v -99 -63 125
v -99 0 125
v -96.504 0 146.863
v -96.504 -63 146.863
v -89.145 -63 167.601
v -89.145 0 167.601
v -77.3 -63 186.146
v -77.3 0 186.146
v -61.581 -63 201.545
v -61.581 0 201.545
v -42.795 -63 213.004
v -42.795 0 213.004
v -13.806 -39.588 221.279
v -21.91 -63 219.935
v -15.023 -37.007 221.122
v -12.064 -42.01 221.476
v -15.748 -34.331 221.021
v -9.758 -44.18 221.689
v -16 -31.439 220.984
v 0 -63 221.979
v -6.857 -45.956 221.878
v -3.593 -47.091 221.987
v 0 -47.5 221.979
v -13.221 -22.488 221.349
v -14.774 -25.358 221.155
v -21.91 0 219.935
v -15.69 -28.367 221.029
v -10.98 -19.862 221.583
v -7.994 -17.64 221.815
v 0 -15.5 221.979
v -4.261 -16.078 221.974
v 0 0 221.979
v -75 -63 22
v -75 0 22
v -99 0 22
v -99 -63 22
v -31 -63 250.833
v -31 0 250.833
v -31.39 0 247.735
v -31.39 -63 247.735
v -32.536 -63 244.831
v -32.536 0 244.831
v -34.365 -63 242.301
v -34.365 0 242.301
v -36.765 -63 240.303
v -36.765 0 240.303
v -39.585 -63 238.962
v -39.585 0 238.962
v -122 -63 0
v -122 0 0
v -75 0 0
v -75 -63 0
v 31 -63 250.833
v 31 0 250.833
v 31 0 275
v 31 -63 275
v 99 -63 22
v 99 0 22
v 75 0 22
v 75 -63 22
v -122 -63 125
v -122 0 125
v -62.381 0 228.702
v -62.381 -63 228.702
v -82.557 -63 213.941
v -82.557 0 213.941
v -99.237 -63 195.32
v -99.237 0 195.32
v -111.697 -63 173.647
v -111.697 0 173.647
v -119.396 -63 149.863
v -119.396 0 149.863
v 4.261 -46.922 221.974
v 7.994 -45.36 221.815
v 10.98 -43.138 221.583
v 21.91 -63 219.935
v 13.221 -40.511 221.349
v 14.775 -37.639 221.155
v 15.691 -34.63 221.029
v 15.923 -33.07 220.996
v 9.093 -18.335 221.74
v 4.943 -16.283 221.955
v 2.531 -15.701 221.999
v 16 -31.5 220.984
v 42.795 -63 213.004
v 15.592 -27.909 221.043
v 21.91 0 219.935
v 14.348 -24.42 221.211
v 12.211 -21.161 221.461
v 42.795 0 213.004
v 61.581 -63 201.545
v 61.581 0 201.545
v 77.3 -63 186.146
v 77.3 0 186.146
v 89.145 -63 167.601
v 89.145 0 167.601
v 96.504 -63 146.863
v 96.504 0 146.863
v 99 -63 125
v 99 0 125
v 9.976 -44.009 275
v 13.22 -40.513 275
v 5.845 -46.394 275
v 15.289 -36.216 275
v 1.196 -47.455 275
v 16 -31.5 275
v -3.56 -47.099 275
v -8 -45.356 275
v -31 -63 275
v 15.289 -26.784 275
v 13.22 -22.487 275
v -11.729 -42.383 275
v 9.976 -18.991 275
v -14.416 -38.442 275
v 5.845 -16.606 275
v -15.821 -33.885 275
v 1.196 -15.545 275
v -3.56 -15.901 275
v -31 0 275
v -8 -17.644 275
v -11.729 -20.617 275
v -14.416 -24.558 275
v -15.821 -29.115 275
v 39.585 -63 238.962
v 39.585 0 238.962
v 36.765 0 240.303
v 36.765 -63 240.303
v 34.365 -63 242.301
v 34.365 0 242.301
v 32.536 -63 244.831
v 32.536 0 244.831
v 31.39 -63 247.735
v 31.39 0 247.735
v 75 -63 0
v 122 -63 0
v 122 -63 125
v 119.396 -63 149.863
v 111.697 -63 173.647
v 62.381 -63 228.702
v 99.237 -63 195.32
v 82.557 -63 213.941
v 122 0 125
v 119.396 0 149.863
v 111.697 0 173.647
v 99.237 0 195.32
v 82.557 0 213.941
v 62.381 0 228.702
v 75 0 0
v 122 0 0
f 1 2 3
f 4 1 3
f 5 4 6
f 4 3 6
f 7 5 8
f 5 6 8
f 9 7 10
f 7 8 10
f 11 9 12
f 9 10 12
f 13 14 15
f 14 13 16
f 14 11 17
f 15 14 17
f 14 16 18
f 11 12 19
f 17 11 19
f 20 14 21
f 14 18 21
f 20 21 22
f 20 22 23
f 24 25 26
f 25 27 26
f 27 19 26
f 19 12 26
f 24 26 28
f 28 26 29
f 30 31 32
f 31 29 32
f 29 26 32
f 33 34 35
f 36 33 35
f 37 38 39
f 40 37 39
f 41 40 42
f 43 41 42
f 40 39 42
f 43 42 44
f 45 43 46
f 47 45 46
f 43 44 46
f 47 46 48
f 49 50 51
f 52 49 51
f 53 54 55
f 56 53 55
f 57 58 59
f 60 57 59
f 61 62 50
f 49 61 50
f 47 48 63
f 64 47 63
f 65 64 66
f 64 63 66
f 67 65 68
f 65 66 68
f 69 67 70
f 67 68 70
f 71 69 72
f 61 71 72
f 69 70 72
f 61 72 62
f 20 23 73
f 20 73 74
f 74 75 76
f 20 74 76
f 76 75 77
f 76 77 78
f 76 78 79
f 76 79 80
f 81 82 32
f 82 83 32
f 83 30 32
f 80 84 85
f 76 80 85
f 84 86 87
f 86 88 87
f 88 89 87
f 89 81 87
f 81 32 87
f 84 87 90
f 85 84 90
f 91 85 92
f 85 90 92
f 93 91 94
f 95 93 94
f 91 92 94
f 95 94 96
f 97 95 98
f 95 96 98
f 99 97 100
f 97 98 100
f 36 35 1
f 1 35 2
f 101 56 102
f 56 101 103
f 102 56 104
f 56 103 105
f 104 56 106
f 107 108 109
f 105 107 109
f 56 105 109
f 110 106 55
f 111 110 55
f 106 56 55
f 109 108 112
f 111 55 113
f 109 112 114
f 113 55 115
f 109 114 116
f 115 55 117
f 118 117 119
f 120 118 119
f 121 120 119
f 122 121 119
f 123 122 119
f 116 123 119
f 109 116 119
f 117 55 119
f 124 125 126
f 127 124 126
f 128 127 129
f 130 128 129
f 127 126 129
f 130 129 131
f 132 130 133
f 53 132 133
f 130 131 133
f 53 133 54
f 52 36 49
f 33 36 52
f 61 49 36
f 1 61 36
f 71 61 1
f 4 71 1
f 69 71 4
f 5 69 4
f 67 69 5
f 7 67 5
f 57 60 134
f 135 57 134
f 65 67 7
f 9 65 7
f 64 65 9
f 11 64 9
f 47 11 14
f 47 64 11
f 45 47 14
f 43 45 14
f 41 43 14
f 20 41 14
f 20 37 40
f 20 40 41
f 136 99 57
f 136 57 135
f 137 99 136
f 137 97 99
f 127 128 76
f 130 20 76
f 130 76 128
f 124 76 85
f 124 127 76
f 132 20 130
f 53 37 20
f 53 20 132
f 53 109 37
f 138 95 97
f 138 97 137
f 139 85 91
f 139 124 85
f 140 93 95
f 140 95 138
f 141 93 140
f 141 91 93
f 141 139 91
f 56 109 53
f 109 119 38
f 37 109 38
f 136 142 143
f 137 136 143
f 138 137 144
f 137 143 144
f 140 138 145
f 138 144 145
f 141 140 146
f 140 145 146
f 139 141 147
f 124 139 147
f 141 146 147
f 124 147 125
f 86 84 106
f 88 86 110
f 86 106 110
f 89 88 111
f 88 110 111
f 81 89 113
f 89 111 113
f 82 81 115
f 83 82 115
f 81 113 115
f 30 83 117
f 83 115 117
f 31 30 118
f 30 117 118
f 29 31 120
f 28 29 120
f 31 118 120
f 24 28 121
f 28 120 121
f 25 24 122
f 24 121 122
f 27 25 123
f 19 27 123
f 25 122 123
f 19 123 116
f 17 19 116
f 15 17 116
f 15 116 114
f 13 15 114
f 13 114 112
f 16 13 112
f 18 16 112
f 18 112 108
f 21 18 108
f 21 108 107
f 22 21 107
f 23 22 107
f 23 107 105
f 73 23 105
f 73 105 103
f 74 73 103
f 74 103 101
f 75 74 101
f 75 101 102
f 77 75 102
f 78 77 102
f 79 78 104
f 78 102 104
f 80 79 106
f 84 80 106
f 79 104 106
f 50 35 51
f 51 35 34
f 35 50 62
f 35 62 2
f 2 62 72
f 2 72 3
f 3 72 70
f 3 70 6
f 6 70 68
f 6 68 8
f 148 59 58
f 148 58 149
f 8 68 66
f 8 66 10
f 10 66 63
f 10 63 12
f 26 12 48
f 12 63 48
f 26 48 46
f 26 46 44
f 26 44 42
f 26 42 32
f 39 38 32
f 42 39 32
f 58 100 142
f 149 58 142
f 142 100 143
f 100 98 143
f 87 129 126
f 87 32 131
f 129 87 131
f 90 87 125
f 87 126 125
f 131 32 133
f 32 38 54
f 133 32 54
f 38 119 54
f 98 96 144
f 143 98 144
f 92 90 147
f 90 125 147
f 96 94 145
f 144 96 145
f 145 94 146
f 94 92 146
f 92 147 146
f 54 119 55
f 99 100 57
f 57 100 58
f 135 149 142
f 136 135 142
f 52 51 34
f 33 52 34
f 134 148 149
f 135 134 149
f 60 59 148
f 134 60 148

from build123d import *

# Parameters (mm, degrees)
F1_DEPTH = 63
F2_R     = 16
F3_DEPTH = 275.001


with BuildPart() as f1:
    # F0 (on Front) → F1 (new body)
    with BuildSketch(Plane.XZ):
        with BuildLine():
            Line((-122, 125), (-122, 0))
            Line((-122, 0), (-75, 0))
            Line((-75, 0), (-75, 22))
            Line((-75, 22), (-99, 22))
            Line((-99, 22), (-99, 125))
            ThreePointArc((-99, 125), (-69.878568, 194.292857), (0, 221.979379))
            ThreePointArc((0, 221.979379), (69.878568, 194.292857), (99, 125))
            Line((99, 125), (99, 22))
            Line((99, 22), (75, 22))
            Line((75, 22), (75, 0))
            Line((75, 0), (122, 0))
            Line((122, 0), (122, 125))
            ThreePointArc((122, 125), (99.237309, 195.320023), (39.584906, 238.962164))
            ThreePointArc((39.584906, 238.962164), (33.371114, 243.508221), (31, 250.833223))
            Line((31, 250.833223), (31, 275))
            Line((31, 275), (0, 275))
            Line((0, 275), (-31, 275))
            Line((-31, 275), (-31, 250.833223))
            ThreePointArc((-31, 250.833223), (-33.371114, 243.508221), (-39.584906, 238.962164))
            ThreePointArc((-39.584906, 238.962164), (-99.237309, 195.320023), (-122, 125))
        make_face()
    extrude(amount=F1_DEPTH)

    # F2 (on face) → F3 (cut, through all)
    with BuildSketch(Plane.XY.offset(275)):
        with Locations((0, -31.5)):
            Circle(F2_R)
    extrude(amount=-F3_DEPTH, mode=Mode.SUBTRACT)


solid = f1.part
